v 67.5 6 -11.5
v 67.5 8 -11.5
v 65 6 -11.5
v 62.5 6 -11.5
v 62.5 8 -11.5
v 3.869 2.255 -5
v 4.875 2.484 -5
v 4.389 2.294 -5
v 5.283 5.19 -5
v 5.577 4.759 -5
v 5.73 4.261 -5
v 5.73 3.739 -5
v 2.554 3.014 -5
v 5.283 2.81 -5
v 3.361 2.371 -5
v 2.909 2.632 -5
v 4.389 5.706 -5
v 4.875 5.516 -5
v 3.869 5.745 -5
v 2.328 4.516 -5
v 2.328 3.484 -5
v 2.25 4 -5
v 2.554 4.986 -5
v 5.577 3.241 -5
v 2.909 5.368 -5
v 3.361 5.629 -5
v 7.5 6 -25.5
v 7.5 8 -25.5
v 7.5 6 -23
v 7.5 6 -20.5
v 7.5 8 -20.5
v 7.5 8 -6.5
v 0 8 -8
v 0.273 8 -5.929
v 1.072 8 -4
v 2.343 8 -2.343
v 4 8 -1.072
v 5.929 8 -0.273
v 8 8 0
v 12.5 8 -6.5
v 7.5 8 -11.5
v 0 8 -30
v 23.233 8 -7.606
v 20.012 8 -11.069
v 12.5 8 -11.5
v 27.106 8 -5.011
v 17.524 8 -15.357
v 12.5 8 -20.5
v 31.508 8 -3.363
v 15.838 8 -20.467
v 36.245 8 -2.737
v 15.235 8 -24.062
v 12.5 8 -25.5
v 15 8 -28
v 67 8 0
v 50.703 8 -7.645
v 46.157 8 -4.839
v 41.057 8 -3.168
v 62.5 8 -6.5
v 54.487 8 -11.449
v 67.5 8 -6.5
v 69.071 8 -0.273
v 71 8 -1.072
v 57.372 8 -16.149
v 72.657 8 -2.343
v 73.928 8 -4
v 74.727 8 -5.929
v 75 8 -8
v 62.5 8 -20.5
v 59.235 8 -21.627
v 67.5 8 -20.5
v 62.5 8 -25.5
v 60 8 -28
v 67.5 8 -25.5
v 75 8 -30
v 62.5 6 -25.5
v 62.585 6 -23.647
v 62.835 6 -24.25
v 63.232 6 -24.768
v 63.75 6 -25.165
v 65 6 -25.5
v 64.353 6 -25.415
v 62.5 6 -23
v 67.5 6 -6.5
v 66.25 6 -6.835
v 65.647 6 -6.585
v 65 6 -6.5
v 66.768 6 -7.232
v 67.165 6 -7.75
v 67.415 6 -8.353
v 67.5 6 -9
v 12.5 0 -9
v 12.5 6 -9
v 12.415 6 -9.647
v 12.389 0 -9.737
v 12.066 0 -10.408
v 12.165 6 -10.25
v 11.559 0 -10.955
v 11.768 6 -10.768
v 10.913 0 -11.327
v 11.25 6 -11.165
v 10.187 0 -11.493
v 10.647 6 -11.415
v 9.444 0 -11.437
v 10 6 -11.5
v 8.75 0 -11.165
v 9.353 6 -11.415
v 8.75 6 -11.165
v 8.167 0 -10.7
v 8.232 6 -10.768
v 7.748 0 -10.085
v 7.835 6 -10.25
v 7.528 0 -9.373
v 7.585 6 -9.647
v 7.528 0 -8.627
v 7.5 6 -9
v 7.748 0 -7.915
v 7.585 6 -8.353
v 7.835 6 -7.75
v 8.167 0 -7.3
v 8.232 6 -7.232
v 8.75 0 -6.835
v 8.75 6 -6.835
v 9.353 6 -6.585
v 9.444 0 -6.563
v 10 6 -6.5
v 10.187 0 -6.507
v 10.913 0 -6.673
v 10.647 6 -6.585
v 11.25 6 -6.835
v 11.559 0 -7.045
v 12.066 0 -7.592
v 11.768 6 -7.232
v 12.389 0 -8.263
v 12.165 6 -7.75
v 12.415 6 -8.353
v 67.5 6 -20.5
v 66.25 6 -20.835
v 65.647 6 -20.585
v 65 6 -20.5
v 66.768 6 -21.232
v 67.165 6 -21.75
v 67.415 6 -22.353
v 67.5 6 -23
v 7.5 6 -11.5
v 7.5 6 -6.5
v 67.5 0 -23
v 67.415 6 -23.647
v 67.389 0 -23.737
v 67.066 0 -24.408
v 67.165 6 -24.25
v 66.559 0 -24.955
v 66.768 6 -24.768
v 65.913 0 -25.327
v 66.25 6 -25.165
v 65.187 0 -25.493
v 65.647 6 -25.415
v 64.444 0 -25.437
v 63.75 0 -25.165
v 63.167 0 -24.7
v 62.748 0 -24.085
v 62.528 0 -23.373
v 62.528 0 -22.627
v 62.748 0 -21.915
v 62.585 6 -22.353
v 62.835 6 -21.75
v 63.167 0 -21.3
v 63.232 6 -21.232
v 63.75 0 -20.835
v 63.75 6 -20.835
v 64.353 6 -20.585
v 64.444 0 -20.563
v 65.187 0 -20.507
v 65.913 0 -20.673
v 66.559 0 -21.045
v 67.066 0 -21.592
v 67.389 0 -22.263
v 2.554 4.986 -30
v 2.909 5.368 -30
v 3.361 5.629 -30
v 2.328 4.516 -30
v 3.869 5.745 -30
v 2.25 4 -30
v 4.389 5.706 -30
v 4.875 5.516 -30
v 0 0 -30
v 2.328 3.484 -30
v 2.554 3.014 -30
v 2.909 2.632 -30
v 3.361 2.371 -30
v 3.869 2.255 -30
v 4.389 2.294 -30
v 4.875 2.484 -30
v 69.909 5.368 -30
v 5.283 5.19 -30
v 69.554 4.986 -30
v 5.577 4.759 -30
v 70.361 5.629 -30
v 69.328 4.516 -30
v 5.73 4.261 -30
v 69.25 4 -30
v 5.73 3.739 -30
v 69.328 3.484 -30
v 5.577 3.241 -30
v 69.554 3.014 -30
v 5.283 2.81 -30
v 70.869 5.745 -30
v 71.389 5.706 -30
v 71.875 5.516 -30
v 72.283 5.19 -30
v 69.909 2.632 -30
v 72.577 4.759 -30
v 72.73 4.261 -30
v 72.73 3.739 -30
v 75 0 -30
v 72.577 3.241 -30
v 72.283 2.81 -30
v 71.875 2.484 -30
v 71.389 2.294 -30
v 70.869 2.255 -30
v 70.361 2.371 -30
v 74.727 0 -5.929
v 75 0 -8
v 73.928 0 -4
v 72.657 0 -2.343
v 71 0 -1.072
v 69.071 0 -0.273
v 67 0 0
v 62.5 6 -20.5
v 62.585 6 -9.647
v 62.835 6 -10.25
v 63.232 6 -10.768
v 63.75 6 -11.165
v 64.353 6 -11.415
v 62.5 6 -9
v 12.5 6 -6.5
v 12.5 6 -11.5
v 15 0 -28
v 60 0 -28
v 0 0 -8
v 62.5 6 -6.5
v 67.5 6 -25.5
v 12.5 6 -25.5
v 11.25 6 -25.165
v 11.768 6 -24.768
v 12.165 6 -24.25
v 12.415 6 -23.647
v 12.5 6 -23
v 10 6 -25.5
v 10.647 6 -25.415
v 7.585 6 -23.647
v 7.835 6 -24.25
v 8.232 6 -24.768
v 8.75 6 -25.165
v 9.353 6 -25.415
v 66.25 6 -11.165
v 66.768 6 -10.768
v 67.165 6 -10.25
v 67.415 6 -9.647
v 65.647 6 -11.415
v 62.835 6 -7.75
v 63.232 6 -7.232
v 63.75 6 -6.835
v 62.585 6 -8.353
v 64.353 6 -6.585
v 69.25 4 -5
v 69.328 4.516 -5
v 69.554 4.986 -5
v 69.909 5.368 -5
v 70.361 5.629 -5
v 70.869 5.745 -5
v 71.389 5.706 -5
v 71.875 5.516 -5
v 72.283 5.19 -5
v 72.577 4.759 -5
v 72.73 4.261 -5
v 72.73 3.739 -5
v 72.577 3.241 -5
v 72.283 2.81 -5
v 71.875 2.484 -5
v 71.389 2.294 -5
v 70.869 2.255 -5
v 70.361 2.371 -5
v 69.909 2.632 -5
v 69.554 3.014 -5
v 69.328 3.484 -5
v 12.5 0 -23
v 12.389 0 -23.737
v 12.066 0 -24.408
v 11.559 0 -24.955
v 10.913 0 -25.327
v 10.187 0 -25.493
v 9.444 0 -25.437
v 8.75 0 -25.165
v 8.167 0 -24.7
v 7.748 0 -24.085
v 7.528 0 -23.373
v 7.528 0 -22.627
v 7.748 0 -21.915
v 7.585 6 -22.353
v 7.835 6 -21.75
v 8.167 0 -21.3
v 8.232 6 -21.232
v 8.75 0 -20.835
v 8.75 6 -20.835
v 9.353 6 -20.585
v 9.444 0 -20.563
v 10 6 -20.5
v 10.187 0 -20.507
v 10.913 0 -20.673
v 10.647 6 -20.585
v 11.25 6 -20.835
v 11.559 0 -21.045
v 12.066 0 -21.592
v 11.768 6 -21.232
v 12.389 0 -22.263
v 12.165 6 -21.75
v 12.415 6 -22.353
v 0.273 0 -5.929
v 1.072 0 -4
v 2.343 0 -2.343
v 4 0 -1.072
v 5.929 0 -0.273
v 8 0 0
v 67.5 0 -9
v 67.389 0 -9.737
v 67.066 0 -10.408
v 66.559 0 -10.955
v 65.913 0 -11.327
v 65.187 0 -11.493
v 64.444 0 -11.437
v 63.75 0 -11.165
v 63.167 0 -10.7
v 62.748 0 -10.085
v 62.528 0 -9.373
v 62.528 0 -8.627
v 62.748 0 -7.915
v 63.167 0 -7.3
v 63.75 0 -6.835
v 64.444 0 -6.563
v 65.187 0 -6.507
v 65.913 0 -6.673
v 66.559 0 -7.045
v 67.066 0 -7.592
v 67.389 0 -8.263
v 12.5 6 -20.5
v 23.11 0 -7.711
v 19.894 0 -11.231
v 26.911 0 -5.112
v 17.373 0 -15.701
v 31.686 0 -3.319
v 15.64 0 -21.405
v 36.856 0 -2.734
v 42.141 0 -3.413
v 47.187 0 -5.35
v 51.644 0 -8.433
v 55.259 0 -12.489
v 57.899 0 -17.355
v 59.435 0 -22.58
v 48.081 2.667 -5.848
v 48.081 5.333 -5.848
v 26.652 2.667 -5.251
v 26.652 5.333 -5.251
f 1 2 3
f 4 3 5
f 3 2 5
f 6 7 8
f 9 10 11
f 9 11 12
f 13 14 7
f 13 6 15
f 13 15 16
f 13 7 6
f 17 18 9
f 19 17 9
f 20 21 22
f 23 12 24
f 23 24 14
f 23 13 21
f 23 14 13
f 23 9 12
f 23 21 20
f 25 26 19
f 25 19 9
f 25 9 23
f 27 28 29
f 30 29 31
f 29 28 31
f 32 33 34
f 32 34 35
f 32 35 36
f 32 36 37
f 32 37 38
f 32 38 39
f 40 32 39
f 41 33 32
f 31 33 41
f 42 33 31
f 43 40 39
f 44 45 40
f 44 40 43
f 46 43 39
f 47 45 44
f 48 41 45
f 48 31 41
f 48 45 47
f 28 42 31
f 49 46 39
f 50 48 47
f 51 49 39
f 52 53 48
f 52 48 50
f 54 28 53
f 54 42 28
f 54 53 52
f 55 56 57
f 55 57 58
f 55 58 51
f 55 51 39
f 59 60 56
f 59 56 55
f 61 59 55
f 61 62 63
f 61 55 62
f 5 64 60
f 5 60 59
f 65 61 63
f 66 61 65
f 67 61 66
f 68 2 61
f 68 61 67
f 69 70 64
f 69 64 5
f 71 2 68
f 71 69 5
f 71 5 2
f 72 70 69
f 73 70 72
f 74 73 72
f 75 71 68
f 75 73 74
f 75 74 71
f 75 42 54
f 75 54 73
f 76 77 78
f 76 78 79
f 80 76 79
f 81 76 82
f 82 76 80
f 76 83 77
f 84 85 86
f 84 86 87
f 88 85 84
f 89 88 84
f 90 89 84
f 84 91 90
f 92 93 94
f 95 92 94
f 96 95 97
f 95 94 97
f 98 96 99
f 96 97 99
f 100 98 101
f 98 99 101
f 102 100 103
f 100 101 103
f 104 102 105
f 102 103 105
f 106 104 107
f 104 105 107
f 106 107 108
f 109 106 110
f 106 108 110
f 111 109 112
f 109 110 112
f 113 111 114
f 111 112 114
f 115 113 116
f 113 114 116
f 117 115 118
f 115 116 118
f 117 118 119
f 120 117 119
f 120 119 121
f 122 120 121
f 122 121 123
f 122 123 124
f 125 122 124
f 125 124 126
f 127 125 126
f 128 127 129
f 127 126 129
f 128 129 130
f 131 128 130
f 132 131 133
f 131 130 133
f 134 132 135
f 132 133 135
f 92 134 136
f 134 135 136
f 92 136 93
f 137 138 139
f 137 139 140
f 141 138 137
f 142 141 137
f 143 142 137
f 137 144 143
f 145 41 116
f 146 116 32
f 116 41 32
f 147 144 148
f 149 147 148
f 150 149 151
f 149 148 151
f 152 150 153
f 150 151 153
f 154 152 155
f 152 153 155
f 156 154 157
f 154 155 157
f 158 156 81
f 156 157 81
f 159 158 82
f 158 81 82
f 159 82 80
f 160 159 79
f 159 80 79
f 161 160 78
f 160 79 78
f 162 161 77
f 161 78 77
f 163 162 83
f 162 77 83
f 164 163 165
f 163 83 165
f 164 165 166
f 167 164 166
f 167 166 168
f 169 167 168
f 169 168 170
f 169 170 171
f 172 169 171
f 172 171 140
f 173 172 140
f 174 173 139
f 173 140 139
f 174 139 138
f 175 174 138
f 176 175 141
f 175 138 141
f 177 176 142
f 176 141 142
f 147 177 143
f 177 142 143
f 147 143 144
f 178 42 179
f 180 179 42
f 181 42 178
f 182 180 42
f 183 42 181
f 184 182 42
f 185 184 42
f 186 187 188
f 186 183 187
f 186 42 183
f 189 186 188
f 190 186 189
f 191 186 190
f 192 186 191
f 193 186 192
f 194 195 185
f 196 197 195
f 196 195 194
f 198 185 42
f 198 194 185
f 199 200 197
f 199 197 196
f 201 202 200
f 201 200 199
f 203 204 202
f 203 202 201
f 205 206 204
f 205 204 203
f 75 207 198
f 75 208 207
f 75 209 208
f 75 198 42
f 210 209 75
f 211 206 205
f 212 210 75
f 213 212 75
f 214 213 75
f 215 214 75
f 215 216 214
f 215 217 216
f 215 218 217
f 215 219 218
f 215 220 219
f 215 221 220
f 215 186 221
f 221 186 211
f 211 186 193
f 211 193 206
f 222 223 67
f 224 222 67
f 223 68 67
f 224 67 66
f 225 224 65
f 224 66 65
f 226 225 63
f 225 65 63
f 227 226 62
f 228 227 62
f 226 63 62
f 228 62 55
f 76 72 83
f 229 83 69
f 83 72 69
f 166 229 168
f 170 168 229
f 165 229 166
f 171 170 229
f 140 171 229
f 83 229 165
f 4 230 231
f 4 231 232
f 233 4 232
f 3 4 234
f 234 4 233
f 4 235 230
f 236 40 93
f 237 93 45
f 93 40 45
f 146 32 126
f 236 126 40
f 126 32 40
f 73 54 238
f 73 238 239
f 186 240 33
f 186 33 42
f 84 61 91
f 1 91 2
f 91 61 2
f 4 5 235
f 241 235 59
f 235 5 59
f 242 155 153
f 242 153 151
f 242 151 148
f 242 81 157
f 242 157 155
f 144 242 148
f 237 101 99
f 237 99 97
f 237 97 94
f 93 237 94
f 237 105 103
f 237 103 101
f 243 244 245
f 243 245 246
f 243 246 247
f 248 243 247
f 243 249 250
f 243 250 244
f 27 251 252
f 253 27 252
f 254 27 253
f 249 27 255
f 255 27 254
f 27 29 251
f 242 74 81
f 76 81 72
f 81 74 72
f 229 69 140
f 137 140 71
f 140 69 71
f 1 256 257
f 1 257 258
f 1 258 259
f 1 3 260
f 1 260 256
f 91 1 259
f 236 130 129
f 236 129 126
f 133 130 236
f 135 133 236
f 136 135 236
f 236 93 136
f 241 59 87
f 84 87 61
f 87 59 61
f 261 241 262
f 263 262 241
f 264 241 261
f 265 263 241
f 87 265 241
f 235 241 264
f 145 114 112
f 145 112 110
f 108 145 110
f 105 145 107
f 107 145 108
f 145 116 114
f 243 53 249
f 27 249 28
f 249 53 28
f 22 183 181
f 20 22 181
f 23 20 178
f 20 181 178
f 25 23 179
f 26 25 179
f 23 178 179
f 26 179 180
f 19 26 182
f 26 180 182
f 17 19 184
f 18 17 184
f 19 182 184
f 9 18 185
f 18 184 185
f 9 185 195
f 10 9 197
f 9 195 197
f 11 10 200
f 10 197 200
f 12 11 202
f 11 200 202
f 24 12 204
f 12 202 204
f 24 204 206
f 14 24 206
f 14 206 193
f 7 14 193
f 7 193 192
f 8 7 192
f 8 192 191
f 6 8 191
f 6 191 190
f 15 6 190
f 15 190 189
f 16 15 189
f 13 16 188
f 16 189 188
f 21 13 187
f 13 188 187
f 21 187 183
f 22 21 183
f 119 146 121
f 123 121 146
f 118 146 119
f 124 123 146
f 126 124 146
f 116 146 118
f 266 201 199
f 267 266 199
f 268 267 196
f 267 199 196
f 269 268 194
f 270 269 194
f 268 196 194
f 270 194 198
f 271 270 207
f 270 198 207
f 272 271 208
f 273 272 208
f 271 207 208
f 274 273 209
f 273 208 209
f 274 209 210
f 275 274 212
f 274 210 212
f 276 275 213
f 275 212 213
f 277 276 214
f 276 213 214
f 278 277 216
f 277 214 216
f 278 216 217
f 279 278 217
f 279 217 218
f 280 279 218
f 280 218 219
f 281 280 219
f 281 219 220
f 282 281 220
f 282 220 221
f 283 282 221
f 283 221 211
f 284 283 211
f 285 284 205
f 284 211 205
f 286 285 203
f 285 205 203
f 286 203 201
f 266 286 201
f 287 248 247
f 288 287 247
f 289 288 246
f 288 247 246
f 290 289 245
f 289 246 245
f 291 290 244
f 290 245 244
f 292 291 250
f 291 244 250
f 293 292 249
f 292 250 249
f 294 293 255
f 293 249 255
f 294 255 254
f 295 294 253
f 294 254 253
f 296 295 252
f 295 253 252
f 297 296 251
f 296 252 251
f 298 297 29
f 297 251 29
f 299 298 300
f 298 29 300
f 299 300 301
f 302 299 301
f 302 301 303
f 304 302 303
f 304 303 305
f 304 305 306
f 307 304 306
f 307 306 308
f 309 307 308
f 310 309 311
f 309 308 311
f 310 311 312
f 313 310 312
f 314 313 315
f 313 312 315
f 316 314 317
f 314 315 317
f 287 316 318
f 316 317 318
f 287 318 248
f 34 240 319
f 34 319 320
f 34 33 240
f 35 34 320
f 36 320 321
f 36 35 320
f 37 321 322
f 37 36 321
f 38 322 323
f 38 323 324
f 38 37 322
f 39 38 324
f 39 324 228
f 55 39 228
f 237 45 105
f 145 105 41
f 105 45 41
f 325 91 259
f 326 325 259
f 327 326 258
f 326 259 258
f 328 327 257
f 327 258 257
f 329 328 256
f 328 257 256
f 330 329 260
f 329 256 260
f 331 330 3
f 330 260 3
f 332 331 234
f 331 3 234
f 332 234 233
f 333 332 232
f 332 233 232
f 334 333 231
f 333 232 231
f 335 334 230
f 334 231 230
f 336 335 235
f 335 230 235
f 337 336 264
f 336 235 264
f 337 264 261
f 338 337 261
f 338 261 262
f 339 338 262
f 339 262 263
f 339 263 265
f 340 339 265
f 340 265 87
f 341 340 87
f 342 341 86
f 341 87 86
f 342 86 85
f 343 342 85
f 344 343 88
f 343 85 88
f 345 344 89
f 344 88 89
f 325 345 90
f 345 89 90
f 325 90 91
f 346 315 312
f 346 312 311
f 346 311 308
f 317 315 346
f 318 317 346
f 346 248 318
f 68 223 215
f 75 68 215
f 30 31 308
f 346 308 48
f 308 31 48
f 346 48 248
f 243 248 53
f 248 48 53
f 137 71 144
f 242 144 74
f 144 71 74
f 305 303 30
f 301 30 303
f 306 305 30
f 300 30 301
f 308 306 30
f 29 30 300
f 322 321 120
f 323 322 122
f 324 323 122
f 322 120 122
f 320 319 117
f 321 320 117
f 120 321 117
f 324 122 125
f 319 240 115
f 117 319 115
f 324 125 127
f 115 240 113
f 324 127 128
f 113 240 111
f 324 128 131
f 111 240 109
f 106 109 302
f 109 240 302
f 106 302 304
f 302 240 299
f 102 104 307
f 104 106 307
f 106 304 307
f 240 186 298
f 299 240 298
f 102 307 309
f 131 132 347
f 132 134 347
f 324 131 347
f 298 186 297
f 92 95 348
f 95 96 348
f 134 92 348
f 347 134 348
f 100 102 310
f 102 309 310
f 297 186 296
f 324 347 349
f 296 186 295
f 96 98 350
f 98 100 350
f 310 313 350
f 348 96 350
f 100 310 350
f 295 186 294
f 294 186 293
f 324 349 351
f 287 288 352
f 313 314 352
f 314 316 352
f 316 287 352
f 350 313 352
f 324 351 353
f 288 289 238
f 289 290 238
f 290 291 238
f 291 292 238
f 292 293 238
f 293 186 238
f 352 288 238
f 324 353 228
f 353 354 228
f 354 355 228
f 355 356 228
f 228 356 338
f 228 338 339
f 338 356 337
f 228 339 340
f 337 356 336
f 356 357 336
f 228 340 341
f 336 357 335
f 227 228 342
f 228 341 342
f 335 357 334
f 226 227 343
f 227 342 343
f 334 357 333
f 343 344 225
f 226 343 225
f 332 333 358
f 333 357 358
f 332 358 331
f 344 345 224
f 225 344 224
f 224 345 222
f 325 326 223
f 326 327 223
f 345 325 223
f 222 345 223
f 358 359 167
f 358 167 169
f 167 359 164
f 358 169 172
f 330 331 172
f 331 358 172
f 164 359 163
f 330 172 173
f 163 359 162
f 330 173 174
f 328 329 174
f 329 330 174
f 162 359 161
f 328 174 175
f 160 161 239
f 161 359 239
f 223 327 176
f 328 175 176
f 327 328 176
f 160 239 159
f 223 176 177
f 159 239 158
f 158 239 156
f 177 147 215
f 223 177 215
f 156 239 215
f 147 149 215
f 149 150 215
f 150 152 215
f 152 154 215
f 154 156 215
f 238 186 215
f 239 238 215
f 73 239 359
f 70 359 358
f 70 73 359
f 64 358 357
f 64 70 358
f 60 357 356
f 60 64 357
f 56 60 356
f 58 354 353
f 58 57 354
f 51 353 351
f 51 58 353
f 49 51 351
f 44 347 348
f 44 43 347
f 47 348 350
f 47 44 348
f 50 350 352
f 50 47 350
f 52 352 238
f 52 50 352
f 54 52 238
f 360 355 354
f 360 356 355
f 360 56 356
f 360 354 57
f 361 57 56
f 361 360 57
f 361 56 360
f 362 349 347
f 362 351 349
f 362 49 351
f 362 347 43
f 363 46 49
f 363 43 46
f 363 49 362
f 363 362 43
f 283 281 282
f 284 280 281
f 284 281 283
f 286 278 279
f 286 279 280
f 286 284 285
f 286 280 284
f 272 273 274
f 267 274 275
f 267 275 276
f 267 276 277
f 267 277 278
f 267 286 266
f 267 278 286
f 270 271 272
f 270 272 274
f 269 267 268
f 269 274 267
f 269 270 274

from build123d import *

# Parameters (mm, degrees)
SKETCH1_W           = 75
SKETCH1_H           = 30
BOSS_EXTRUDE1_DEPTH = 8
SKETCH2_R           = 2.5
CUT_EXTRUDE1_DEPTH  = 9
CUT_EXTRUDE2_DEPTH  = 2
FILLET1_R           = 8
SKETCH3_R           = 1.75
CUT_EXTRUDE3_DEPTH  = 25


with BuildPart() as part:
    # Sketch1 → Boss-Extrude1 (new body)
    with BuildSketch(Plane(origin=(0, 0, 0), x_dir=(1, 0, 0), z_dir=(0, 1, 0))):
        with Locations((37.5, 15)):
            Rectangle(SKETCH1_W, SKETCH1_H)
    extrude(amount=BOSS_EXTRUDE1_DEPTH)

    # Sketch2 → Cut-Extrude1 (cut, through all)
    with BuildSketch(Plane(origin=(0, 8, 0), x_dir=(1, 0, 0), z_dir=(0, 1, 0))):
        with Locations((10, 23)):
            Circle(SKETCH2_R)
        with Locations((10, 9)):
            Circle(SKETCH2_R)
        with Locations((65, 23)):
            Circle(SKETCH2_R)
        with Locations((65, 9)):
            Circle(SKETCH2_R)
        with BuildLine():
            Line((15, 28), (60, 28))
            add(Edge.make_bspline(
                [(60, 28), (59.263620849, -4.332136717), (15.33607355, -7.019589548), (15, 28)],
                knots=[0, 0, 0, 0, 1, 1, 1, 1], degree=3))
        make_face()
    extrude(amount=-CUT_EXTRUDE1_DEPTH, mode=Mode.SUBTRACT)

    # Sketch2<3> → Cut-Extrude2 (cut)
    with BuildSketch(Plane(origin=(0, 8, 0), x_dir=(1, 0, 0), z_dir=(0, 1, 0))):
        with BuildLine():
            Line((12.5, 6.5), (12.5, 9))
            ThreePointArc((12.5, 9), (11.767766965, 7.232233059), (10.000000035, 6.5))
            Line((10.000000035, 6.5), (12.5, 6.5))
        make_face()
        with BuildLine():
            Line((12.5, 9), (12.5, 11.5))
            Line((12.5, 11.5), (10, 11.5))
            ThreePointArc((10, 11.5), (11.767766953, 10.767766953), (12.5, 9))
        make_face()
        with BuildLine():
            ThreePointArc((7.5, 9), (8.232233047, 10.767766953), (10, 11.5))
            Line((10, 11.5), (7.5, 11.5))
            Line((7.5, 11.5), (7.5, 9))
        make_face()
        with BuildLine():
            ThreePointArc((10.000000035, 6.5), (8.232233059, 7.232233035), (7.5, 9))
            Line((7.5, 9), (7.5, 6.5))
            Line((7.5, 6.5), (10.000000035, 6.5))
        make_face()
        with BuildLine():
            ThreePointArc((7.5, 23), (8.232233047, 24.767766953), (10, 25.5))
            Line((10, 25.5), (7.5, 25.5))
            Line((7.5, 25.5), (7.5, 23))
        make_face()
        with BuildLine():
            Line((12.5, 23), (12.5, 25.5))
            Line((12.5, 25.5), (10, 25.5))
            ThreePointArc((10, 25.5), (11.767766953, 24.767766953), (12.5, 23))
        make_face()
        with BuildLine():
            Line((12.5, 20.5), (12.5, 23))
            ThreePointArc((12.5, 23), (11.767766953, 21.232233047), (10, 20.5))
            Line((10, 20.5), (12.5, 20.5))
        make_face()
        with BuildLine():
            ThreePointArc((10, 20.5), (8.232233047, 21.232233047), (7.5, 23))
            Line((7.5, 23), (7.5, 20.5))
            Line((7.5, 20.5), (10, 20.5))
        make_face()
        with BuildLine():
            Line((65, 25.5), (62.5, 25.5))
            Line((62.5, 25.5), (62.5, 23))
            ThreePointArc((62.5, 23), (63.232233047, 24.767766953), (65, 25.5))
        make_face()
        with BuildLine():
            Line((67.5, 25.5), (65, 25.5))
            ThreePointArc((65, 25.5), (66.767766953, 24.767766953), (67.5, 23))
            Line((67.5, 23), (67.5, 25.5))
        make_face()
        with BuildLine():
            Line((67.5, 20.5), (67.5, 23))
            ThreePointArc((67.5, 23), (66.767766953, 21.232233047), (65, 20.5))
            Line((65, 20.5), (67.5, 20.5))
        make_face()
        with BuildLine():
            ThreePointArc((65, 20.5), (63.232233047, 21.232233047), (62.5, 23))
            Line((62.5, 23), (62.5, 20.5))
            Line((62.5, 20.5), (65, 20.5))
        make_face()
        with BuildLine():
            Line((67.5, 6.5), (67.5, 9))
            ThreePointArc((67.5, 9), (66.767766953, 7.232233047), (65, 6.5))
            Line((65, 6.5), (67.5, 6.5))
        make_face()
        with BuildLine():
            ThreePointArc((65, 6.5), (63.232233047, 7.232233047), (62.5, 9))
            Line((62.5, 9), (62.5, 6.5))
            Line((62.5, 6.5), (65, 6.5))
        make_face()
        with BuildLine():
            Line((65, 11.5), (62.5, 11.5))
            Line((62.5, 11.5), (62.5, 9))
            ThreePointArc((62.5, 9), (63.232233047, 10.767766953), (65, 11.5))
        make_face()
        with BuildLine():
            Line((67.5, 11.5), (65, 11.5))
            ThreePointArc((65, 11.5), (66.767766953, 10.767766953), (67.5, 9))
            Line((67.5, 9), (67.5, 11.5))
        make_face()
    extrude(amount=-CUT_EXTRUDE2_DEPTH, mode=Mode.SUBTRACT)

    # Fillet1
    fillet1_edges = [part.edges().sort_by_distance(p)[0] for p in [
        (75, 4, 0),
        (0, 4, 0),
    ]]
    fillet(fillet1_edges, radius=FILLET1_R)

    # Sketch3 → Cut-Extrude3 (cut)
    with BuildSketch(Plane(origin=(0, 0, -30), x_dir=(-1, 0, 0), z_dir=(0, 0, -1))):
        with Locations((-4, 4)):
            Circle(SKETCH3_R)
        with Locations((-71, 4)):
            Circle(SKETCH3_R)
    extrude(amount=-CUT_EXTRUDE3_DEPTH, mode=Mode.SUBTRACT)


solid = part.part
